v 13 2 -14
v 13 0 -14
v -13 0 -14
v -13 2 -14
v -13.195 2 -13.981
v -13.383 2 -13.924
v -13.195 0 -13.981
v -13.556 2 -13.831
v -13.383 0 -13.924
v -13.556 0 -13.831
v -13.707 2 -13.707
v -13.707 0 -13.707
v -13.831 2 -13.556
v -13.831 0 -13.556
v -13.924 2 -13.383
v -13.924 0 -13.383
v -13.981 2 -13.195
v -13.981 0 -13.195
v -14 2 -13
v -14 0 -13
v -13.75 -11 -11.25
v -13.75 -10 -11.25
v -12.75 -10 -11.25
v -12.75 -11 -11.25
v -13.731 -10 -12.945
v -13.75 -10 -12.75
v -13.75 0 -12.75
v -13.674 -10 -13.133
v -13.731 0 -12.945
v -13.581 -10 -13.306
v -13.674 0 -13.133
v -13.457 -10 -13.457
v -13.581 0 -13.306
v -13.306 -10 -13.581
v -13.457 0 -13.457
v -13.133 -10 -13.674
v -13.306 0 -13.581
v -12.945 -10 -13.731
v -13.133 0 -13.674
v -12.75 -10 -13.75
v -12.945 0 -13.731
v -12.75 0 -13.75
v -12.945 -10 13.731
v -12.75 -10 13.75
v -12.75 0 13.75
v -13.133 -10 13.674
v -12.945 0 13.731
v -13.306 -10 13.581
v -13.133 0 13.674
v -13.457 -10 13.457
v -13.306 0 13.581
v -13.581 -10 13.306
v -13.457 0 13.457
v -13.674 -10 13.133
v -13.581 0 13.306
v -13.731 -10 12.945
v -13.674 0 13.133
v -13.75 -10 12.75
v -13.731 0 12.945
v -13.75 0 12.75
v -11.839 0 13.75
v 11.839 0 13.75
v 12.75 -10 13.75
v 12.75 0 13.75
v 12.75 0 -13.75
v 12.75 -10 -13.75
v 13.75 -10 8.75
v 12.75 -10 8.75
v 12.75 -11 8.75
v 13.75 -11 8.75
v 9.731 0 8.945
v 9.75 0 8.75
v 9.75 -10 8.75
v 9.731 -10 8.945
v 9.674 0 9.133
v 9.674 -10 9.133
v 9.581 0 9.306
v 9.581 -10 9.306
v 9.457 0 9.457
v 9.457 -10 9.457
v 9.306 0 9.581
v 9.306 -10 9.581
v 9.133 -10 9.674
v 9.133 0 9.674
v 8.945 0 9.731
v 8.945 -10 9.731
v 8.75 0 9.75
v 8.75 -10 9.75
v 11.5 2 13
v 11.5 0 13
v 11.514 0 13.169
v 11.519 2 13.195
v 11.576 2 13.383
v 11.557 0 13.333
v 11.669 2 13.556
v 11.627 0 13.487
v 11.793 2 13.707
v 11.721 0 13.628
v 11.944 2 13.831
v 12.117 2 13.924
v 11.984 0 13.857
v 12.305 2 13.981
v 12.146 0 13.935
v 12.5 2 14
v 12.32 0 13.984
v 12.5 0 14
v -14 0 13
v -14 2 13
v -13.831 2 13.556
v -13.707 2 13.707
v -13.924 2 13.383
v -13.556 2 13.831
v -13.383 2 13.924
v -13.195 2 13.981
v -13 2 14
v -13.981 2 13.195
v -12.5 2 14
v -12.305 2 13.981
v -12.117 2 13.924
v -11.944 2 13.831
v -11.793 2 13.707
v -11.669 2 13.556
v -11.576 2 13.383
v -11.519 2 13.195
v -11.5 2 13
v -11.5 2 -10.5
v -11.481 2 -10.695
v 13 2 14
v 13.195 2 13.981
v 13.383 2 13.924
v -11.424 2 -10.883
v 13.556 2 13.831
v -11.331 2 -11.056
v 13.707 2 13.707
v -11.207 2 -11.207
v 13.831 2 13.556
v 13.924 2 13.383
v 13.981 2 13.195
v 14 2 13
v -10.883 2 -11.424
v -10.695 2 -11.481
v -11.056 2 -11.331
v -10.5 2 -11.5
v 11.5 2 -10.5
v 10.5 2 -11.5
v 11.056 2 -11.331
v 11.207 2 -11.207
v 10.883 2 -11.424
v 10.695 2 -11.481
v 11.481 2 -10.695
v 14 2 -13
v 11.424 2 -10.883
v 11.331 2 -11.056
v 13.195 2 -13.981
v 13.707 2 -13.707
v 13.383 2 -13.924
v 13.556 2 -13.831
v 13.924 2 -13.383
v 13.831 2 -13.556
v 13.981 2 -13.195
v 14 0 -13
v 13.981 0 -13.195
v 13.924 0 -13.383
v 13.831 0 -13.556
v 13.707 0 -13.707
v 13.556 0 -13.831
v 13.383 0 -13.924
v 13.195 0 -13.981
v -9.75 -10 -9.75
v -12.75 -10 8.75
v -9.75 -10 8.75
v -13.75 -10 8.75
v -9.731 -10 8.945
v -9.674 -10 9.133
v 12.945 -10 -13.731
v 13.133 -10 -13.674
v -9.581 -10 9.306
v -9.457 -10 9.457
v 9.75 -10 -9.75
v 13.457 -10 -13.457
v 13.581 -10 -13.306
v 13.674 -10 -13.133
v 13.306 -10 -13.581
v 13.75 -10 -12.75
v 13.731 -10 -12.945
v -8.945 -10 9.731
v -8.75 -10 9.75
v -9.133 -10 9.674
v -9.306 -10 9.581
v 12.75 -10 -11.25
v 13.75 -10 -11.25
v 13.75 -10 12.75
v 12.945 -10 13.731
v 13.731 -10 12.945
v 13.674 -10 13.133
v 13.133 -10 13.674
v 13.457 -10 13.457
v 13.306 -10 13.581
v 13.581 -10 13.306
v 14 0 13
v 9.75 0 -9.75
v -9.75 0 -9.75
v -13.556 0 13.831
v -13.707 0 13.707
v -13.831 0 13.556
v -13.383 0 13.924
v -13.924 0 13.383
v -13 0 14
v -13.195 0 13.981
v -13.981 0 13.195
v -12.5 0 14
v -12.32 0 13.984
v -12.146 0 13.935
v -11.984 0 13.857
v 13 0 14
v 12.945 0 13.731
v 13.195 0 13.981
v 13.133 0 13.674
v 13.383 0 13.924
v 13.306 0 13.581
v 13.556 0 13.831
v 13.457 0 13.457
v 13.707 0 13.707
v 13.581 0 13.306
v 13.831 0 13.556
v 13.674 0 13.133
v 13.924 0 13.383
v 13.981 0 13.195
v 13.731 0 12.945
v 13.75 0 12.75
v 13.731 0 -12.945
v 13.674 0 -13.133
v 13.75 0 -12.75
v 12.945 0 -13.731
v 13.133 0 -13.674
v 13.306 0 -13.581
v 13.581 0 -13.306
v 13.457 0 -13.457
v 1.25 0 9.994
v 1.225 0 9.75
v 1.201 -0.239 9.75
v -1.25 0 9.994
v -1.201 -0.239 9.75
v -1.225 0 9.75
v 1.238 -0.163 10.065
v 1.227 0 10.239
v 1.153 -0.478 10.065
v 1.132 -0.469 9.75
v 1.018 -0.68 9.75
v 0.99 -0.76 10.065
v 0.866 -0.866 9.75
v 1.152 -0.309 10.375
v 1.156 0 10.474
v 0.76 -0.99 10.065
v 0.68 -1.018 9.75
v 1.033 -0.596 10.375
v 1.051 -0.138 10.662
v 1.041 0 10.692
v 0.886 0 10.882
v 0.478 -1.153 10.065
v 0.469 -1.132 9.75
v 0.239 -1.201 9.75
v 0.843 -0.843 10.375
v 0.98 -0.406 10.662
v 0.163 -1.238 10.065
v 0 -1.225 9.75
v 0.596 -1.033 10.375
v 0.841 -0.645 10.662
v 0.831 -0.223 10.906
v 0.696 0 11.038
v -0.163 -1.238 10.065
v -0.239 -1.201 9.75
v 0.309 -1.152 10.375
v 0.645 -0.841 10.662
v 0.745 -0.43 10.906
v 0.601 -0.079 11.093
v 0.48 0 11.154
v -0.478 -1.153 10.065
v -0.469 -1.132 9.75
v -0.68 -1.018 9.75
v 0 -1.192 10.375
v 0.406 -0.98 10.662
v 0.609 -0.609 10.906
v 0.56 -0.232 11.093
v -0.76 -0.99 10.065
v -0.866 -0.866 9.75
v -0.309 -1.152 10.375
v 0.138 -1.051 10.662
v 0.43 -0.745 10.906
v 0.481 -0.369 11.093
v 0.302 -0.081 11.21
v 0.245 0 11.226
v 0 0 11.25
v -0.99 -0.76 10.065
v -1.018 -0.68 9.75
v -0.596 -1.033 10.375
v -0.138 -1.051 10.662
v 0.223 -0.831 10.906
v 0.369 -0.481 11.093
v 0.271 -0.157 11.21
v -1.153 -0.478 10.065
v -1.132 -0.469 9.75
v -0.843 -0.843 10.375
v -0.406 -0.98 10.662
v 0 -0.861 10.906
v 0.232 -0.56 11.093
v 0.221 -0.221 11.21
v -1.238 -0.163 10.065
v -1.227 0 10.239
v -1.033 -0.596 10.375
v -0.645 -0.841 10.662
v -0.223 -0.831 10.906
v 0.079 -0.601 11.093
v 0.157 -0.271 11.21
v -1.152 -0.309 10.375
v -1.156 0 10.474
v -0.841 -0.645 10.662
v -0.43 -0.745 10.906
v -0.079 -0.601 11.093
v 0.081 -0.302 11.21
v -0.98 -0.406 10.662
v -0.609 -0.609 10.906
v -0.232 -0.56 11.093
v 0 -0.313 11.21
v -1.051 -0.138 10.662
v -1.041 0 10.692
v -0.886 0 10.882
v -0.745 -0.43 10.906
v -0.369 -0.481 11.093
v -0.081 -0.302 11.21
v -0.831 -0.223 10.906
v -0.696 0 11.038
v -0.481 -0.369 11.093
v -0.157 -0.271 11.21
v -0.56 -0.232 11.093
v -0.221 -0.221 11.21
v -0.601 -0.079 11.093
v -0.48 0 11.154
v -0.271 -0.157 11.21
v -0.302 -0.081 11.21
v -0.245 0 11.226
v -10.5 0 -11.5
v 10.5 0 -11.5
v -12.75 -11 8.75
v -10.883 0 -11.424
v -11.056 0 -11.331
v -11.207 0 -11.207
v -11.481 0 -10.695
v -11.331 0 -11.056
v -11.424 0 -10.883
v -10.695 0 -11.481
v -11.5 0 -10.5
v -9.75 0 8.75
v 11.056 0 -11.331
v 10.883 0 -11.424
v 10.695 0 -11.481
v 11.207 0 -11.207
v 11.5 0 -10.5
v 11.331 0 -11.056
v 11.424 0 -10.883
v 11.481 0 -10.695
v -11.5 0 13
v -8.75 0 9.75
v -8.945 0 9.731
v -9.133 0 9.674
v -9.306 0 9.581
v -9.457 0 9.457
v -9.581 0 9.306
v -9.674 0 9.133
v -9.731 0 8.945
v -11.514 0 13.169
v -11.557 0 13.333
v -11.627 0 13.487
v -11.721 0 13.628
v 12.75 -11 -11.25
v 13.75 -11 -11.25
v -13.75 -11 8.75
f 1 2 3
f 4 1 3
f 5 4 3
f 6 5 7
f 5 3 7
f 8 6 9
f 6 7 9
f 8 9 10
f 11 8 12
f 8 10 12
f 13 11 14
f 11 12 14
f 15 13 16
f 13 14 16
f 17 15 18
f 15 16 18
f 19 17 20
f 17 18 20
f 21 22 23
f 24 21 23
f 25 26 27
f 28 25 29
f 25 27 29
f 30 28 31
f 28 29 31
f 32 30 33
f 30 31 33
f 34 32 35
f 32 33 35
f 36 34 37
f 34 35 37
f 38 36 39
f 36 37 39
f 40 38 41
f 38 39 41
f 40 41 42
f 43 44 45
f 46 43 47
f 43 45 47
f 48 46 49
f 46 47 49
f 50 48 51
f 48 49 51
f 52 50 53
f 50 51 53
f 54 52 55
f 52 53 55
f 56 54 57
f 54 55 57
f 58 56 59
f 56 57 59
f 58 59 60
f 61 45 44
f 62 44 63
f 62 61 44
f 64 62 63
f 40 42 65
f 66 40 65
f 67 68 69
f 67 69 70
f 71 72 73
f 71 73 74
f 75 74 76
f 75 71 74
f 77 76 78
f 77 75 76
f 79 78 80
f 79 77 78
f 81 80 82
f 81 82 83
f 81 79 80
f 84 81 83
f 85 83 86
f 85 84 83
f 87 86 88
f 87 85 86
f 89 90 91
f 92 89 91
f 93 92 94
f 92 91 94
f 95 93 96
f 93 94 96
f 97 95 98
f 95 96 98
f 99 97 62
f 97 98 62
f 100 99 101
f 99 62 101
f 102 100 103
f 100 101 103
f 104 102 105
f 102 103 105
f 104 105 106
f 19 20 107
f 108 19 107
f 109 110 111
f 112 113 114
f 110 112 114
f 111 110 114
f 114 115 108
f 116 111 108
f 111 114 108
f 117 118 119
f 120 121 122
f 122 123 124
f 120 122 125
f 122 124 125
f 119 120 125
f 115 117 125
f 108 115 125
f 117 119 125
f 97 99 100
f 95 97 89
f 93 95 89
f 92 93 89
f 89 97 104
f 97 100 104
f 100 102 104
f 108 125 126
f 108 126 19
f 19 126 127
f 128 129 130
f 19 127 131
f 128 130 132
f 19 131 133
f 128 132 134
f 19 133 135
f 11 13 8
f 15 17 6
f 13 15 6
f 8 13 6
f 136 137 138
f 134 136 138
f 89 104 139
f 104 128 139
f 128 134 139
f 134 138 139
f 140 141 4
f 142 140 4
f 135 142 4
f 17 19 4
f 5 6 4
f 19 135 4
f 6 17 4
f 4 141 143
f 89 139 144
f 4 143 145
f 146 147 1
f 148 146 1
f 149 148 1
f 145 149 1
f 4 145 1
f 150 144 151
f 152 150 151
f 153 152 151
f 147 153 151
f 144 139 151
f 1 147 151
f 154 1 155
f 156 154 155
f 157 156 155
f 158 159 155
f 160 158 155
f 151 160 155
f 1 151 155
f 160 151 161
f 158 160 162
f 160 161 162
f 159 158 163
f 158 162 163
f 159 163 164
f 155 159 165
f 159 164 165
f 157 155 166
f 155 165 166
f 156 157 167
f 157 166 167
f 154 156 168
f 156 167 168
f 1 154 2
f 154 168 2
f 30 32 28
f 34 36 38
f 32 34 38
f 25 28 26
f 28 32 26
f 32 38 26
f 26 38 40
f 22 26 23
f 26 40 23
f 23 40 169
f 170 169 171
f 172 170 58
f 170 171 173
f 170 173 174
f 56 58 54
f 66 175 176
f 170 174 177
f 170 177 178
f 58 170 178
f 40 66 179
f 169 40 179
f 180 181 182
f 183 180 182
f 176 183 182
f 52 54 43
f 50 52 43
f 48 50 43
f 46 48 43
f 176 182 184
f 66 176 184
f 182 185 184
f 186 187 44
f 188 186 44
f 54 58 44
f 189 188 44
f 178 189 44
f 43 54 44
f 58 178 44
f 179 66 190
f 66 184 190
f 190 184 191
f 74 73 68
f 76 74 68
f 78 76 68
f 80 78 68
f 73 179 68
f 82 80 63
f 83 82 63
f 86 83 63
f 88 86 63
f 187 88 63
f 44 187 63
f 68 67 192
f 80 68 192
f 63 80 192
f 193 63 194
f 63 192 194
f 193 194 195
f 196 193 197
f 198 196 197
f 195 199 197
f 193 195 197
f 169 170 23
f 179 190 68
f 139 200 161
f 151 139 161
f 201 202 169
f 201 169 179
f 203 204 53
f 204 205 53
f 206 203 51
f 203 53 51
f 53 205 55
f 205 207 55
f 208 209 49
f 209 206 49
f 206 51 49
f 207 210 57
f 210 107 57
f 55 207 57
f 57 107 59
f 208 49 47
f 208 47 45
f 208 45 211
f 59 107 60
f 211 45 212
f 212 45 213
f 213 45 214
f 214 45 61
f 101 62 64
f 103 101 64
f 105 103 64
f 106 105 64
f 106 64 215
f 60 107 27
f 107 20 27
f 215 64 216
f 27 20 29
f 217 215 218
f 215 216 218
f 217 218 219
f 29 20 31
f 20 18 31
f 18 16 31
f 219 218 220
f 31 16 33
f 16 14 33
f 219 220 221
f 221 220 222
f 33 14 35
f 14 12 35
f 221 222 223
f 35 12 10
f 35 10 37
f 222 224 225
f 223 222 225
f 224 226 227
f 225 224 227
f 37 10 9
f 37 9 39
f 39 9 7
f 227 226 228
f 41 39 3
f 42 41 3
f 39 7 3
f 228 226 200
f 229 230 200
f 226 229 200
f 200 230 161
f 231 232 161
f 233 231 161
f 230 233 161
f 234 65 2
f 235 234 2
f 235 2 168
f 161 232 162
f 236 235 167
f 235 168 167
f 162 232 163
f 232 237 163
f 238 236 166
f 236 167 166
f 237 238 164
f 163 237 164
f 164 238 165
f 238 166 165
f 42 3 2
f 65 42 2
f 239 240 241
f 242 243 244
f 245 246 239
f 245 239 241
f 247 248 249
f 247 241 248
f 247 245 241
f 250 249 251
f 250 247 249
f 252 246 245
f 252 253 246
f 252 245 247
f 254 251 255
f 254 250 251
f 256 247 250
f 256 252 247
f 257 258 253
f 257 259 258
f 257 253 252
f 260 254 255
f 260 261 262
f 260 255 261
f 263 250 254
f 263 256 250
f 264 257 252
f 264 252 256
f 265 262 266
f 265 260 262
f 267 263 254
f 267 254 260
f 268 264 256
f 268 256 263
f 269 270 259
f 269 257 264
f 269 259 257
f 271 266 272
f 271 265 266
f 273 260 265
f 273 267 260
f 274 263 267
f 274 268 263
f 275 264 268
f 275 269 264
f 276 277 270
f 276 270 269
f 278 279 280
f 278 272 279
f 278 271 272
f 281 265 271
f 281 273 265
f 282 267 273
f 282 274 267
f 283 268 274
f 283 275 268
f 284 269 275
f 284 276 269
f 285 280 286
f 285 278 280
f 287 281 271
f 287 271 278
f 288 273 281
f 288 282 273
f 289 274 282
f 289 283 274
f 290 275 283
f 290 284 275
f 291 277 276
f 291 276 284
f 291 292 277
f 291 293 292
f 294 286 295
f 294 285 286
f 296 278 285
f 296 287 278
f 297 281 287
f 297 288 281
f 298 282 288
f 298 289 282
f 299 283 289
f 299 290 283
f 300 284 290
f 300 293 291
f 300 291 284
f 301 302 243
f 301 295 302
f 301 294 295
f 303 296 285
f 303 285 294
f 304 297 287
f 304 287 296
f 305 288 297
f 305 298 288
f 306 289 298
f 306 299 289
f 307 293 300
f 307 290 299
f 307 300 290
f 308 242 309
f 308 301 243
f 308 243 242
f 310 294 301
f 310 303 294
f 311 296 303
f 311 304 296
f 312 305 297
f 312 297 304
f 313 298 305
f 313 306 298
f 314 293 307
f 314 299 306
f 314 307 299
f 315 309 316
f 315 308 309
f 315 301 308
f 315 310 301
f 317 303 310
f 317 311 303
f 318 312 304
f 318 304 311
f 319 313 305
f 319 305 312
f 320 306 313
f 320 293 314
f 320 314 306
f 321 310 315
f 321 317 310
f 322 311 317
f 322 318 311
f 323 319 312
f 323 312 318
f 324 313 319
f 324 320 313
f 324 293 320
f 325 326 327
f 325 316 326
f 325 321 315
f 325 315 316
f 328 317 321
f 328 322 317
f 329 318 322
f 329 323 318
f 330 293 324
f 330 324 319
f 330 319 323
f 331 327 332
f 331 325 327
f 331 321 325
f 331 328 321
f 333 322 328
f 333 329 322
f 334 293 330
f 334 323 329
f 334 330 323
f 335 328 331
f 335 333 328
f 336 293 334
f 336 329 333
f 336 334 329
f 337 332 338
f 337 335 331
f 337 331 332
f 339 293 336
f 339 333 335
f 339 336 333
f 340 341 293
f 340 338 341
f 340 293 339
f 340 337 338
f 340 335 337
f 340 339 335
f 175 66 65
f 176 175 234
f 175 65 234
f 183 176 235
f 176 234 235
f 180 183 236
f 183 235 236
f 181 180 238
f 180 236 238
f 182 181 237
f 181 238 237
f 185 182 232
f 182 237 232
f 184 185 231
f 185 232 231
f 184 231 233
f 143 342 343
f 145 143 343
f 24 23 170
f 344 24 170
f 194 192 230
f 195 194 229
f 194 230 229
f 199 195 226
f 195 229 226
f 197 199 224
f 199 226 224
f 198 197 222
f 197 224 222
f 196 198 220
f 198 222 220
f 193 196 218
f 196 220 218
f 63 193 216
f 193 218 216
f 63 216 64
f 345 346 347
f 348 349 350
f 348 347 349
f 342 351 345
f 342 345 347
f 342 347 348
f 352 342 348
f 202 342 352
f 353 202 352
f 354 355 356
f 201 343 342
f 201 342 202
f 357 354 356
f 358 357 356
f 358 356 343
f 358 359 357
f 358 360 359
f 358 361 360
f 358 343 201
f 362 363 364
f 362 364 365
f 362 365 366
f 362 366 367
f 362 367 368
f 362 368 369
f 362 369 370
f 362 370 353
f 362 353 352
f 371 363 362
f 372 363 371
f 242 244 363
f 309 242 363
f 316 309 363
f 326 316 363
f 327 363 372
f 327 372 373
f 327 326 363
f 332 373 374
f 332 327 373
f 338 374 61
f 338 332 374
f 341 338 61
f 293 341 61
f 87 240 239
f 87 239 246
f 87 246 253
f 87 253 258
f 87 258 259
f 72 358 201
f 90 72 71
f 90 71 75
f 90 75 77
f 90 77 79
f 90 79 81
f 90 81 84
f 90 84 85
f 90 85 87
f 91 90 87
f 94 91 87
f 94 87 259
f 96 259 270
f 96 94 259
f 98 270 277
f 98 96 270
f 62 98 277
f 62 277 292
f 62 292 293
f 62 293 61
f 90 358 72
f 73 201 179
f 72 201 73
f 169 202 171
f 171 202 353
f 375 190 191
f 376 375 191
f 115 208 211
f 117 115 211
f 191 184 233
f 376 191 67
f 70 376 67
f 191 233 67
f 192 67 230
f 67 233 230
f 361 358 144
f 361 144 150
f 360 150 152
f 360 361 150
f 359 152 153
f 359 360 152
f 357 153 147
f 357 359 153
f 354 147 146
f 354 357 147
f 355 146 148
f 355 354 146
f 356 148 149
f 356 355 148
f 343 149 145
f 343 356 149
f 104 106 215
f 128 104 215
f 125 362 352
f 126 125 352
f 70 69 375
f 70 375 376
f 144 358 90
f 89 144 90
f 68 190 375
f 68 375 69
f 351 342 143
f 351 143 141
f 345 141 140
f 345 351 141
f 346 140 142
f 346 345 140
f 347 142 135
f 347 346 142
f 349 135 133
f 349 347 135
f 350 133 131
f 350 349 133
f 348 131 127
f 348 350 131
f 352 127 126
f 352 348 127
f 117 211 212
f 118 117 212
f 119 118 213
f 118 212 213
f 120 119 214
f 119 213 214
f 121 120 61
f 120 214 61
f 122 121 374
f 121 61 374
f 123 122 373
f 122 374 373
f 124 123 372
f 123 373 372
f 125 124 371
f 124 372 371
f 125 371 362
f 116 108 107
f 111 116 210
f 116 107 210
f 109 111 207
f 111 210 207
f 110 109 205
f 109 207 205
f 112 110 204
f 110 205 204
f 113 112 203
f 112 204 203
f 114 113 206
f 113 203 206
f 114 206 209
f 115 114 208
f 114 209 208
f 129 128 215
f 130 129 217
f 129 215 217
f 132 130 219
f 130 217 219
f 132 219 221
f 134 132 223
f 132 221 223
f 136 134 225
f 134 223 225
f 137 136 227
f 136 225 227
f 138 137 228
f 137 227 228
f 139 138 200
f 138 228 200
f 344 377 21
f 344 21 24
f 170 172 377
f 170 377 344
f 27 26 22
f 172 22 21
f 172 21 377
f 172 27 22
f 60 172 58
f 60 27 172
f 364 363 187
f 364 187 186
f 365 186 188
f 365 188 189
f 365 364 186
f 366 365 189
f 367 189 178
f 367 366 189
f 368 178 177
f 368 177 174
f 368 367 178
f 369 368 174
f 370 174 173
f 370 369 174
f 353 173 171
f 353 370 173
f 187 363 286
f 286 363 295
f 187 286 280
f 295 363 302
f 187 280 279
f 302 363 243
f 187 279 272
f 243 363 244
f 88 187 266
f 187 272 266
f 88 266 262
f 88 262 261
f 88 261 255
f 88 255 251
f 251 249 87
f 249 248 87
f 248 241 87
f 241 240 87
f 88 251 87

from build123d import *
from build123d.topology import SkipClean

# Parameters (mm, degrees)
BOSS_EXTRUDE1_DEPTH = 2
SKETCH3_W           = 27.5
SKETCH3_H           = 27.5
SKETCH3_W_2         = 19.5
SKETCH3_H_2         = 19.5
BOSS_EXTRUDE2_DEPTH = 10
SKETCH4_W           = 1
SKETCH4_H           = 20
BOSS_EXTRUDE3_DEPTH = 1
FILLET2_R           = 1


with BuildPart() as part:
    # Sketch1 → Boss-Extrude1 (new body)
    with BuildSketch(Plane(origin=(0, 0, 0), x_dir=(1, 0, 0), z_dir=(0, 1, 0))):
        Polygon((-14, 14), (-14, -14), (-11.5, -14), (-11.5, 11.5), (11.5, 11.5), (11.5, -14), (14, -14), (14, 14), align=None)
    extrude(amount=BOSS_EXTRUDE1_DEPTH)

    # Sketch3 → Boss-Extrude2 (add)
    with BuildSketch(Plane.XZ):
        Rectangle(SKETCH3_W, SKETCH3_H)
        Rectangle(SKETCH3_W_2, SKETCH3_H_2, mode=Mode.SUBTRACT)
    extrude(amount=BOSS_EXTRUDE2_DEPTH)

    # Sketch4 → Boss-Extrude3 (add)
    with BuildSketch(Plane.XZ.offset(10)):
        with Locations((-13.25, -1.25)):
            Rectangle(SKETCH4_W, SKETCH4_H)
        with Locations((13.25, -1.25)):
            Rectangle(SKETCH4_W, SKETCH4_H)
    extrude(amount=BOSS_EXTRUDE3_DEPTH)

    # Sketch5 → Cut-Revolve4 (revolve, cut)
    with SkipClean():  # the faces are left unmerged after this step: merging them gives an invalid solid
        with BuildSketch(Plane(origin=(0, 0, 0), x_dir=(0, 0, -1), z_dir=(1, 0, 0))):
            with BuildLine():
                ThreePointArc((-8.75, 0), (-10, 1.25), (-11.25, 0))
                Line((-11.25, 0), (-8.75, 0))
            make_face()
            with BuildLine():
                Line((-8.75, 0), (-11.25, 0))
                ThreePointArc((-11.25, 0), (-10, -1.25), (-8.75, 0))
            make_face()
        revolve(axis=Axis((0, 0, 1000), (0, 0, -1)), mode=Mode.SUBTRACT)
    add(part.part.scale(1), mode=Mode.REPLACE)  # the faces are merged on a copy

    # Fillet2
    # the kernel refuses this fillet: 1 mm, written as the material it adds along each edge
    with BuildSketch(Plane(origin=(11.5, -2.5, -11.5), x_dir=(0, 0, 1), z_dir=(0, 1, 0))) as fillet2_piece_1:
        with BuildLine():
            CenterArc((FILLET2_R, -FILLET2_R), FILLET2_R, 90, 90)
            Line((0, -FILLET2_R), (0, 0))
            Line((0, 0), (FILLET2_R, 0))
        make_face()
    extrude(amount=4.5)
    with BuildSketch(Plane(origin=(-11.5, -2.5, -11.5), x_dir=(0, 0, 1), z_dir=(0, 1, 0))) as fillet2_piece_2:
        with BuildLine():
            CenterArc((FILLET2_R, FILLET2_R), FILLET2_R, 180, 90)
            Line((0, FILLET2_R), (0, 0))
            Line((0, 0), (FILLET2_R, 0))
        make_face()
    extrude(amount=4.5)
    with BuildSketch(Plane(origin=(-9.75, 0, 9.75), x_dir=(0, 0, -1), z_dir=(0, -1, 0))) as fillet2_piece_3:
        with BuildLine():
            CenterArc((FILLET2_R, FILLET2_R), FILLET2_R, 180, 90)
            Line((0, FILLET2_R), (0, 0))
            Line((0, 0), (FILLET2_R, 0))
        make_face()
    extrude(amount=10)
    with BuildSketch(Plane(origin=(9.75, 0, 9.75), x_dir=(0, 0, -1), z_dir=(0, -1, 0))) as fillet2_piece_4:
        with BuildLine():
            CenterArc((FILLET2_R, -FILLET2_R), FILLET2_R, 90, 90)
            Line((0, -FILLET2_R), (0, 0))
            Line((0, 0), (FILLET2_R, 0))
        make_face()
    extrude(amount=10)
    # the kernel refuses this fillet: 1 mm, written as the material it takes off along each edge
    with BuildSketch(Plane(origin=(-11.5, 0, 14), x_dir=(-1, 0, 0), z_dir=(0, 1, 0))) as fillet2_2_piece_1:
        with BuildLine():
            CenterArc((FILLET2_R, -FILLET2_R), FILLET2_R, 90, 90)
            Line((0, -FILLET2_R), (0, 0))
            Line((0, 0), (FILLET2_R, 0))
        make_face()
    extrude(amount=4.5, mode=Mode.SUBTRACT)
    with BuildSketch(Plane(origin=(-14, -2.5, 14), x_dir=(0, 0, -1), z_dir=(0, 1, 0))) as fillet2_2_piece_2:
        with BuildLine():
            CenterArc((FILLET2_R, -FILLET2_R), FILLET2_R, 90, 90)
            Line((0, -FILLET2_R), (0, 0))
            Line((0, 0), (FILLET2_R, 0))
        make_face()
    extrude(amount=7, mode=Mode.SUBTRACT)
    with BuildSketch(Plane(origin=(-14, -2.5, -14), x_dir=(0, 0, 1), z_dir=(0, 1, 0)), Plane(origin=(14, -2.5, -14), x_dir=(-1, 0, 0), z_dir=(0, 1, 0)), Plane(origin=(14, -2.5, 14), x_dir=(0, 0, -1), z_dir=(0, 1, 0))) as fillet2_2_piece_3:
        with BuildLine():
            CenterArc((FILLET2_R, FILLET2_R), FILLET2_R, 180, 90)
            Line((0, FILLET2_R), (0, 0))
            Line((0, 0), (FILLET2_R, 0))
        make_face()
    extrude(amount=7, mode=Mode.SUBTRACT)
    with BuildSketch(Plane(origin=(11.5, 0, 14), x_dir=(1, 0, 0), z_dir=(0, 1, 0))) as fillet2_2_piece_4:
        with BuildLine():
            CenterArc((FILLET2_R, FILLET2_R), FILLET2_R, 180, 90)
            Line((0, FILLET2_R), (0, 0))
            Line((0, 0), (FILLET2_R, 0))
        make_face()
    extrude(amount=4.5, mode=Mode.SUBTRACT)
    with BuildSketch(Plane(origin=(13.75, 0, 13.75), x_dir=(-1, 0, 0), z_dir=(0, -1, 0)), Plane(origin=(-13.75, 0, -13.75), x_dir=(1, 0, 0), z_dir=(0, -1, 0)), Plane(origin=(13.75, 0, -13.75), x_dir=(0, 0, 1), z_dir=(0, -1, 0))) as fillet2_2_piece_5:
        with BuildLine():
            CenterArc((FILLET2_R, FILLET2_R), FILLET2_R, 180, 90)
            Line((0, FILLET2_R), (0, 0))
            Line((0, 0), (FILLET2_R, 0))
        make_face()
    extrude(amount=12.5, mode=Mode.SUBTRACT)
    with BuildSketch(Plane(origin=(-13.75, 0, 13.75), x_dir=(1, 0, 0), z_dir=(0, -1, 0))) as fillet2_2_piece_6:
        with BuildLine():
            CenterArc((FILLET2_R, -FILLET2_R), FILLET2_R, 90, 90)
            Line((0, -FILLET2_R), (0, 0))
            Line((0, 0), (FILLET2_R, 0))
        make_face()
    extrude(amount=12.5, mode=Mode.SUBTRACT)


solid = part.part
